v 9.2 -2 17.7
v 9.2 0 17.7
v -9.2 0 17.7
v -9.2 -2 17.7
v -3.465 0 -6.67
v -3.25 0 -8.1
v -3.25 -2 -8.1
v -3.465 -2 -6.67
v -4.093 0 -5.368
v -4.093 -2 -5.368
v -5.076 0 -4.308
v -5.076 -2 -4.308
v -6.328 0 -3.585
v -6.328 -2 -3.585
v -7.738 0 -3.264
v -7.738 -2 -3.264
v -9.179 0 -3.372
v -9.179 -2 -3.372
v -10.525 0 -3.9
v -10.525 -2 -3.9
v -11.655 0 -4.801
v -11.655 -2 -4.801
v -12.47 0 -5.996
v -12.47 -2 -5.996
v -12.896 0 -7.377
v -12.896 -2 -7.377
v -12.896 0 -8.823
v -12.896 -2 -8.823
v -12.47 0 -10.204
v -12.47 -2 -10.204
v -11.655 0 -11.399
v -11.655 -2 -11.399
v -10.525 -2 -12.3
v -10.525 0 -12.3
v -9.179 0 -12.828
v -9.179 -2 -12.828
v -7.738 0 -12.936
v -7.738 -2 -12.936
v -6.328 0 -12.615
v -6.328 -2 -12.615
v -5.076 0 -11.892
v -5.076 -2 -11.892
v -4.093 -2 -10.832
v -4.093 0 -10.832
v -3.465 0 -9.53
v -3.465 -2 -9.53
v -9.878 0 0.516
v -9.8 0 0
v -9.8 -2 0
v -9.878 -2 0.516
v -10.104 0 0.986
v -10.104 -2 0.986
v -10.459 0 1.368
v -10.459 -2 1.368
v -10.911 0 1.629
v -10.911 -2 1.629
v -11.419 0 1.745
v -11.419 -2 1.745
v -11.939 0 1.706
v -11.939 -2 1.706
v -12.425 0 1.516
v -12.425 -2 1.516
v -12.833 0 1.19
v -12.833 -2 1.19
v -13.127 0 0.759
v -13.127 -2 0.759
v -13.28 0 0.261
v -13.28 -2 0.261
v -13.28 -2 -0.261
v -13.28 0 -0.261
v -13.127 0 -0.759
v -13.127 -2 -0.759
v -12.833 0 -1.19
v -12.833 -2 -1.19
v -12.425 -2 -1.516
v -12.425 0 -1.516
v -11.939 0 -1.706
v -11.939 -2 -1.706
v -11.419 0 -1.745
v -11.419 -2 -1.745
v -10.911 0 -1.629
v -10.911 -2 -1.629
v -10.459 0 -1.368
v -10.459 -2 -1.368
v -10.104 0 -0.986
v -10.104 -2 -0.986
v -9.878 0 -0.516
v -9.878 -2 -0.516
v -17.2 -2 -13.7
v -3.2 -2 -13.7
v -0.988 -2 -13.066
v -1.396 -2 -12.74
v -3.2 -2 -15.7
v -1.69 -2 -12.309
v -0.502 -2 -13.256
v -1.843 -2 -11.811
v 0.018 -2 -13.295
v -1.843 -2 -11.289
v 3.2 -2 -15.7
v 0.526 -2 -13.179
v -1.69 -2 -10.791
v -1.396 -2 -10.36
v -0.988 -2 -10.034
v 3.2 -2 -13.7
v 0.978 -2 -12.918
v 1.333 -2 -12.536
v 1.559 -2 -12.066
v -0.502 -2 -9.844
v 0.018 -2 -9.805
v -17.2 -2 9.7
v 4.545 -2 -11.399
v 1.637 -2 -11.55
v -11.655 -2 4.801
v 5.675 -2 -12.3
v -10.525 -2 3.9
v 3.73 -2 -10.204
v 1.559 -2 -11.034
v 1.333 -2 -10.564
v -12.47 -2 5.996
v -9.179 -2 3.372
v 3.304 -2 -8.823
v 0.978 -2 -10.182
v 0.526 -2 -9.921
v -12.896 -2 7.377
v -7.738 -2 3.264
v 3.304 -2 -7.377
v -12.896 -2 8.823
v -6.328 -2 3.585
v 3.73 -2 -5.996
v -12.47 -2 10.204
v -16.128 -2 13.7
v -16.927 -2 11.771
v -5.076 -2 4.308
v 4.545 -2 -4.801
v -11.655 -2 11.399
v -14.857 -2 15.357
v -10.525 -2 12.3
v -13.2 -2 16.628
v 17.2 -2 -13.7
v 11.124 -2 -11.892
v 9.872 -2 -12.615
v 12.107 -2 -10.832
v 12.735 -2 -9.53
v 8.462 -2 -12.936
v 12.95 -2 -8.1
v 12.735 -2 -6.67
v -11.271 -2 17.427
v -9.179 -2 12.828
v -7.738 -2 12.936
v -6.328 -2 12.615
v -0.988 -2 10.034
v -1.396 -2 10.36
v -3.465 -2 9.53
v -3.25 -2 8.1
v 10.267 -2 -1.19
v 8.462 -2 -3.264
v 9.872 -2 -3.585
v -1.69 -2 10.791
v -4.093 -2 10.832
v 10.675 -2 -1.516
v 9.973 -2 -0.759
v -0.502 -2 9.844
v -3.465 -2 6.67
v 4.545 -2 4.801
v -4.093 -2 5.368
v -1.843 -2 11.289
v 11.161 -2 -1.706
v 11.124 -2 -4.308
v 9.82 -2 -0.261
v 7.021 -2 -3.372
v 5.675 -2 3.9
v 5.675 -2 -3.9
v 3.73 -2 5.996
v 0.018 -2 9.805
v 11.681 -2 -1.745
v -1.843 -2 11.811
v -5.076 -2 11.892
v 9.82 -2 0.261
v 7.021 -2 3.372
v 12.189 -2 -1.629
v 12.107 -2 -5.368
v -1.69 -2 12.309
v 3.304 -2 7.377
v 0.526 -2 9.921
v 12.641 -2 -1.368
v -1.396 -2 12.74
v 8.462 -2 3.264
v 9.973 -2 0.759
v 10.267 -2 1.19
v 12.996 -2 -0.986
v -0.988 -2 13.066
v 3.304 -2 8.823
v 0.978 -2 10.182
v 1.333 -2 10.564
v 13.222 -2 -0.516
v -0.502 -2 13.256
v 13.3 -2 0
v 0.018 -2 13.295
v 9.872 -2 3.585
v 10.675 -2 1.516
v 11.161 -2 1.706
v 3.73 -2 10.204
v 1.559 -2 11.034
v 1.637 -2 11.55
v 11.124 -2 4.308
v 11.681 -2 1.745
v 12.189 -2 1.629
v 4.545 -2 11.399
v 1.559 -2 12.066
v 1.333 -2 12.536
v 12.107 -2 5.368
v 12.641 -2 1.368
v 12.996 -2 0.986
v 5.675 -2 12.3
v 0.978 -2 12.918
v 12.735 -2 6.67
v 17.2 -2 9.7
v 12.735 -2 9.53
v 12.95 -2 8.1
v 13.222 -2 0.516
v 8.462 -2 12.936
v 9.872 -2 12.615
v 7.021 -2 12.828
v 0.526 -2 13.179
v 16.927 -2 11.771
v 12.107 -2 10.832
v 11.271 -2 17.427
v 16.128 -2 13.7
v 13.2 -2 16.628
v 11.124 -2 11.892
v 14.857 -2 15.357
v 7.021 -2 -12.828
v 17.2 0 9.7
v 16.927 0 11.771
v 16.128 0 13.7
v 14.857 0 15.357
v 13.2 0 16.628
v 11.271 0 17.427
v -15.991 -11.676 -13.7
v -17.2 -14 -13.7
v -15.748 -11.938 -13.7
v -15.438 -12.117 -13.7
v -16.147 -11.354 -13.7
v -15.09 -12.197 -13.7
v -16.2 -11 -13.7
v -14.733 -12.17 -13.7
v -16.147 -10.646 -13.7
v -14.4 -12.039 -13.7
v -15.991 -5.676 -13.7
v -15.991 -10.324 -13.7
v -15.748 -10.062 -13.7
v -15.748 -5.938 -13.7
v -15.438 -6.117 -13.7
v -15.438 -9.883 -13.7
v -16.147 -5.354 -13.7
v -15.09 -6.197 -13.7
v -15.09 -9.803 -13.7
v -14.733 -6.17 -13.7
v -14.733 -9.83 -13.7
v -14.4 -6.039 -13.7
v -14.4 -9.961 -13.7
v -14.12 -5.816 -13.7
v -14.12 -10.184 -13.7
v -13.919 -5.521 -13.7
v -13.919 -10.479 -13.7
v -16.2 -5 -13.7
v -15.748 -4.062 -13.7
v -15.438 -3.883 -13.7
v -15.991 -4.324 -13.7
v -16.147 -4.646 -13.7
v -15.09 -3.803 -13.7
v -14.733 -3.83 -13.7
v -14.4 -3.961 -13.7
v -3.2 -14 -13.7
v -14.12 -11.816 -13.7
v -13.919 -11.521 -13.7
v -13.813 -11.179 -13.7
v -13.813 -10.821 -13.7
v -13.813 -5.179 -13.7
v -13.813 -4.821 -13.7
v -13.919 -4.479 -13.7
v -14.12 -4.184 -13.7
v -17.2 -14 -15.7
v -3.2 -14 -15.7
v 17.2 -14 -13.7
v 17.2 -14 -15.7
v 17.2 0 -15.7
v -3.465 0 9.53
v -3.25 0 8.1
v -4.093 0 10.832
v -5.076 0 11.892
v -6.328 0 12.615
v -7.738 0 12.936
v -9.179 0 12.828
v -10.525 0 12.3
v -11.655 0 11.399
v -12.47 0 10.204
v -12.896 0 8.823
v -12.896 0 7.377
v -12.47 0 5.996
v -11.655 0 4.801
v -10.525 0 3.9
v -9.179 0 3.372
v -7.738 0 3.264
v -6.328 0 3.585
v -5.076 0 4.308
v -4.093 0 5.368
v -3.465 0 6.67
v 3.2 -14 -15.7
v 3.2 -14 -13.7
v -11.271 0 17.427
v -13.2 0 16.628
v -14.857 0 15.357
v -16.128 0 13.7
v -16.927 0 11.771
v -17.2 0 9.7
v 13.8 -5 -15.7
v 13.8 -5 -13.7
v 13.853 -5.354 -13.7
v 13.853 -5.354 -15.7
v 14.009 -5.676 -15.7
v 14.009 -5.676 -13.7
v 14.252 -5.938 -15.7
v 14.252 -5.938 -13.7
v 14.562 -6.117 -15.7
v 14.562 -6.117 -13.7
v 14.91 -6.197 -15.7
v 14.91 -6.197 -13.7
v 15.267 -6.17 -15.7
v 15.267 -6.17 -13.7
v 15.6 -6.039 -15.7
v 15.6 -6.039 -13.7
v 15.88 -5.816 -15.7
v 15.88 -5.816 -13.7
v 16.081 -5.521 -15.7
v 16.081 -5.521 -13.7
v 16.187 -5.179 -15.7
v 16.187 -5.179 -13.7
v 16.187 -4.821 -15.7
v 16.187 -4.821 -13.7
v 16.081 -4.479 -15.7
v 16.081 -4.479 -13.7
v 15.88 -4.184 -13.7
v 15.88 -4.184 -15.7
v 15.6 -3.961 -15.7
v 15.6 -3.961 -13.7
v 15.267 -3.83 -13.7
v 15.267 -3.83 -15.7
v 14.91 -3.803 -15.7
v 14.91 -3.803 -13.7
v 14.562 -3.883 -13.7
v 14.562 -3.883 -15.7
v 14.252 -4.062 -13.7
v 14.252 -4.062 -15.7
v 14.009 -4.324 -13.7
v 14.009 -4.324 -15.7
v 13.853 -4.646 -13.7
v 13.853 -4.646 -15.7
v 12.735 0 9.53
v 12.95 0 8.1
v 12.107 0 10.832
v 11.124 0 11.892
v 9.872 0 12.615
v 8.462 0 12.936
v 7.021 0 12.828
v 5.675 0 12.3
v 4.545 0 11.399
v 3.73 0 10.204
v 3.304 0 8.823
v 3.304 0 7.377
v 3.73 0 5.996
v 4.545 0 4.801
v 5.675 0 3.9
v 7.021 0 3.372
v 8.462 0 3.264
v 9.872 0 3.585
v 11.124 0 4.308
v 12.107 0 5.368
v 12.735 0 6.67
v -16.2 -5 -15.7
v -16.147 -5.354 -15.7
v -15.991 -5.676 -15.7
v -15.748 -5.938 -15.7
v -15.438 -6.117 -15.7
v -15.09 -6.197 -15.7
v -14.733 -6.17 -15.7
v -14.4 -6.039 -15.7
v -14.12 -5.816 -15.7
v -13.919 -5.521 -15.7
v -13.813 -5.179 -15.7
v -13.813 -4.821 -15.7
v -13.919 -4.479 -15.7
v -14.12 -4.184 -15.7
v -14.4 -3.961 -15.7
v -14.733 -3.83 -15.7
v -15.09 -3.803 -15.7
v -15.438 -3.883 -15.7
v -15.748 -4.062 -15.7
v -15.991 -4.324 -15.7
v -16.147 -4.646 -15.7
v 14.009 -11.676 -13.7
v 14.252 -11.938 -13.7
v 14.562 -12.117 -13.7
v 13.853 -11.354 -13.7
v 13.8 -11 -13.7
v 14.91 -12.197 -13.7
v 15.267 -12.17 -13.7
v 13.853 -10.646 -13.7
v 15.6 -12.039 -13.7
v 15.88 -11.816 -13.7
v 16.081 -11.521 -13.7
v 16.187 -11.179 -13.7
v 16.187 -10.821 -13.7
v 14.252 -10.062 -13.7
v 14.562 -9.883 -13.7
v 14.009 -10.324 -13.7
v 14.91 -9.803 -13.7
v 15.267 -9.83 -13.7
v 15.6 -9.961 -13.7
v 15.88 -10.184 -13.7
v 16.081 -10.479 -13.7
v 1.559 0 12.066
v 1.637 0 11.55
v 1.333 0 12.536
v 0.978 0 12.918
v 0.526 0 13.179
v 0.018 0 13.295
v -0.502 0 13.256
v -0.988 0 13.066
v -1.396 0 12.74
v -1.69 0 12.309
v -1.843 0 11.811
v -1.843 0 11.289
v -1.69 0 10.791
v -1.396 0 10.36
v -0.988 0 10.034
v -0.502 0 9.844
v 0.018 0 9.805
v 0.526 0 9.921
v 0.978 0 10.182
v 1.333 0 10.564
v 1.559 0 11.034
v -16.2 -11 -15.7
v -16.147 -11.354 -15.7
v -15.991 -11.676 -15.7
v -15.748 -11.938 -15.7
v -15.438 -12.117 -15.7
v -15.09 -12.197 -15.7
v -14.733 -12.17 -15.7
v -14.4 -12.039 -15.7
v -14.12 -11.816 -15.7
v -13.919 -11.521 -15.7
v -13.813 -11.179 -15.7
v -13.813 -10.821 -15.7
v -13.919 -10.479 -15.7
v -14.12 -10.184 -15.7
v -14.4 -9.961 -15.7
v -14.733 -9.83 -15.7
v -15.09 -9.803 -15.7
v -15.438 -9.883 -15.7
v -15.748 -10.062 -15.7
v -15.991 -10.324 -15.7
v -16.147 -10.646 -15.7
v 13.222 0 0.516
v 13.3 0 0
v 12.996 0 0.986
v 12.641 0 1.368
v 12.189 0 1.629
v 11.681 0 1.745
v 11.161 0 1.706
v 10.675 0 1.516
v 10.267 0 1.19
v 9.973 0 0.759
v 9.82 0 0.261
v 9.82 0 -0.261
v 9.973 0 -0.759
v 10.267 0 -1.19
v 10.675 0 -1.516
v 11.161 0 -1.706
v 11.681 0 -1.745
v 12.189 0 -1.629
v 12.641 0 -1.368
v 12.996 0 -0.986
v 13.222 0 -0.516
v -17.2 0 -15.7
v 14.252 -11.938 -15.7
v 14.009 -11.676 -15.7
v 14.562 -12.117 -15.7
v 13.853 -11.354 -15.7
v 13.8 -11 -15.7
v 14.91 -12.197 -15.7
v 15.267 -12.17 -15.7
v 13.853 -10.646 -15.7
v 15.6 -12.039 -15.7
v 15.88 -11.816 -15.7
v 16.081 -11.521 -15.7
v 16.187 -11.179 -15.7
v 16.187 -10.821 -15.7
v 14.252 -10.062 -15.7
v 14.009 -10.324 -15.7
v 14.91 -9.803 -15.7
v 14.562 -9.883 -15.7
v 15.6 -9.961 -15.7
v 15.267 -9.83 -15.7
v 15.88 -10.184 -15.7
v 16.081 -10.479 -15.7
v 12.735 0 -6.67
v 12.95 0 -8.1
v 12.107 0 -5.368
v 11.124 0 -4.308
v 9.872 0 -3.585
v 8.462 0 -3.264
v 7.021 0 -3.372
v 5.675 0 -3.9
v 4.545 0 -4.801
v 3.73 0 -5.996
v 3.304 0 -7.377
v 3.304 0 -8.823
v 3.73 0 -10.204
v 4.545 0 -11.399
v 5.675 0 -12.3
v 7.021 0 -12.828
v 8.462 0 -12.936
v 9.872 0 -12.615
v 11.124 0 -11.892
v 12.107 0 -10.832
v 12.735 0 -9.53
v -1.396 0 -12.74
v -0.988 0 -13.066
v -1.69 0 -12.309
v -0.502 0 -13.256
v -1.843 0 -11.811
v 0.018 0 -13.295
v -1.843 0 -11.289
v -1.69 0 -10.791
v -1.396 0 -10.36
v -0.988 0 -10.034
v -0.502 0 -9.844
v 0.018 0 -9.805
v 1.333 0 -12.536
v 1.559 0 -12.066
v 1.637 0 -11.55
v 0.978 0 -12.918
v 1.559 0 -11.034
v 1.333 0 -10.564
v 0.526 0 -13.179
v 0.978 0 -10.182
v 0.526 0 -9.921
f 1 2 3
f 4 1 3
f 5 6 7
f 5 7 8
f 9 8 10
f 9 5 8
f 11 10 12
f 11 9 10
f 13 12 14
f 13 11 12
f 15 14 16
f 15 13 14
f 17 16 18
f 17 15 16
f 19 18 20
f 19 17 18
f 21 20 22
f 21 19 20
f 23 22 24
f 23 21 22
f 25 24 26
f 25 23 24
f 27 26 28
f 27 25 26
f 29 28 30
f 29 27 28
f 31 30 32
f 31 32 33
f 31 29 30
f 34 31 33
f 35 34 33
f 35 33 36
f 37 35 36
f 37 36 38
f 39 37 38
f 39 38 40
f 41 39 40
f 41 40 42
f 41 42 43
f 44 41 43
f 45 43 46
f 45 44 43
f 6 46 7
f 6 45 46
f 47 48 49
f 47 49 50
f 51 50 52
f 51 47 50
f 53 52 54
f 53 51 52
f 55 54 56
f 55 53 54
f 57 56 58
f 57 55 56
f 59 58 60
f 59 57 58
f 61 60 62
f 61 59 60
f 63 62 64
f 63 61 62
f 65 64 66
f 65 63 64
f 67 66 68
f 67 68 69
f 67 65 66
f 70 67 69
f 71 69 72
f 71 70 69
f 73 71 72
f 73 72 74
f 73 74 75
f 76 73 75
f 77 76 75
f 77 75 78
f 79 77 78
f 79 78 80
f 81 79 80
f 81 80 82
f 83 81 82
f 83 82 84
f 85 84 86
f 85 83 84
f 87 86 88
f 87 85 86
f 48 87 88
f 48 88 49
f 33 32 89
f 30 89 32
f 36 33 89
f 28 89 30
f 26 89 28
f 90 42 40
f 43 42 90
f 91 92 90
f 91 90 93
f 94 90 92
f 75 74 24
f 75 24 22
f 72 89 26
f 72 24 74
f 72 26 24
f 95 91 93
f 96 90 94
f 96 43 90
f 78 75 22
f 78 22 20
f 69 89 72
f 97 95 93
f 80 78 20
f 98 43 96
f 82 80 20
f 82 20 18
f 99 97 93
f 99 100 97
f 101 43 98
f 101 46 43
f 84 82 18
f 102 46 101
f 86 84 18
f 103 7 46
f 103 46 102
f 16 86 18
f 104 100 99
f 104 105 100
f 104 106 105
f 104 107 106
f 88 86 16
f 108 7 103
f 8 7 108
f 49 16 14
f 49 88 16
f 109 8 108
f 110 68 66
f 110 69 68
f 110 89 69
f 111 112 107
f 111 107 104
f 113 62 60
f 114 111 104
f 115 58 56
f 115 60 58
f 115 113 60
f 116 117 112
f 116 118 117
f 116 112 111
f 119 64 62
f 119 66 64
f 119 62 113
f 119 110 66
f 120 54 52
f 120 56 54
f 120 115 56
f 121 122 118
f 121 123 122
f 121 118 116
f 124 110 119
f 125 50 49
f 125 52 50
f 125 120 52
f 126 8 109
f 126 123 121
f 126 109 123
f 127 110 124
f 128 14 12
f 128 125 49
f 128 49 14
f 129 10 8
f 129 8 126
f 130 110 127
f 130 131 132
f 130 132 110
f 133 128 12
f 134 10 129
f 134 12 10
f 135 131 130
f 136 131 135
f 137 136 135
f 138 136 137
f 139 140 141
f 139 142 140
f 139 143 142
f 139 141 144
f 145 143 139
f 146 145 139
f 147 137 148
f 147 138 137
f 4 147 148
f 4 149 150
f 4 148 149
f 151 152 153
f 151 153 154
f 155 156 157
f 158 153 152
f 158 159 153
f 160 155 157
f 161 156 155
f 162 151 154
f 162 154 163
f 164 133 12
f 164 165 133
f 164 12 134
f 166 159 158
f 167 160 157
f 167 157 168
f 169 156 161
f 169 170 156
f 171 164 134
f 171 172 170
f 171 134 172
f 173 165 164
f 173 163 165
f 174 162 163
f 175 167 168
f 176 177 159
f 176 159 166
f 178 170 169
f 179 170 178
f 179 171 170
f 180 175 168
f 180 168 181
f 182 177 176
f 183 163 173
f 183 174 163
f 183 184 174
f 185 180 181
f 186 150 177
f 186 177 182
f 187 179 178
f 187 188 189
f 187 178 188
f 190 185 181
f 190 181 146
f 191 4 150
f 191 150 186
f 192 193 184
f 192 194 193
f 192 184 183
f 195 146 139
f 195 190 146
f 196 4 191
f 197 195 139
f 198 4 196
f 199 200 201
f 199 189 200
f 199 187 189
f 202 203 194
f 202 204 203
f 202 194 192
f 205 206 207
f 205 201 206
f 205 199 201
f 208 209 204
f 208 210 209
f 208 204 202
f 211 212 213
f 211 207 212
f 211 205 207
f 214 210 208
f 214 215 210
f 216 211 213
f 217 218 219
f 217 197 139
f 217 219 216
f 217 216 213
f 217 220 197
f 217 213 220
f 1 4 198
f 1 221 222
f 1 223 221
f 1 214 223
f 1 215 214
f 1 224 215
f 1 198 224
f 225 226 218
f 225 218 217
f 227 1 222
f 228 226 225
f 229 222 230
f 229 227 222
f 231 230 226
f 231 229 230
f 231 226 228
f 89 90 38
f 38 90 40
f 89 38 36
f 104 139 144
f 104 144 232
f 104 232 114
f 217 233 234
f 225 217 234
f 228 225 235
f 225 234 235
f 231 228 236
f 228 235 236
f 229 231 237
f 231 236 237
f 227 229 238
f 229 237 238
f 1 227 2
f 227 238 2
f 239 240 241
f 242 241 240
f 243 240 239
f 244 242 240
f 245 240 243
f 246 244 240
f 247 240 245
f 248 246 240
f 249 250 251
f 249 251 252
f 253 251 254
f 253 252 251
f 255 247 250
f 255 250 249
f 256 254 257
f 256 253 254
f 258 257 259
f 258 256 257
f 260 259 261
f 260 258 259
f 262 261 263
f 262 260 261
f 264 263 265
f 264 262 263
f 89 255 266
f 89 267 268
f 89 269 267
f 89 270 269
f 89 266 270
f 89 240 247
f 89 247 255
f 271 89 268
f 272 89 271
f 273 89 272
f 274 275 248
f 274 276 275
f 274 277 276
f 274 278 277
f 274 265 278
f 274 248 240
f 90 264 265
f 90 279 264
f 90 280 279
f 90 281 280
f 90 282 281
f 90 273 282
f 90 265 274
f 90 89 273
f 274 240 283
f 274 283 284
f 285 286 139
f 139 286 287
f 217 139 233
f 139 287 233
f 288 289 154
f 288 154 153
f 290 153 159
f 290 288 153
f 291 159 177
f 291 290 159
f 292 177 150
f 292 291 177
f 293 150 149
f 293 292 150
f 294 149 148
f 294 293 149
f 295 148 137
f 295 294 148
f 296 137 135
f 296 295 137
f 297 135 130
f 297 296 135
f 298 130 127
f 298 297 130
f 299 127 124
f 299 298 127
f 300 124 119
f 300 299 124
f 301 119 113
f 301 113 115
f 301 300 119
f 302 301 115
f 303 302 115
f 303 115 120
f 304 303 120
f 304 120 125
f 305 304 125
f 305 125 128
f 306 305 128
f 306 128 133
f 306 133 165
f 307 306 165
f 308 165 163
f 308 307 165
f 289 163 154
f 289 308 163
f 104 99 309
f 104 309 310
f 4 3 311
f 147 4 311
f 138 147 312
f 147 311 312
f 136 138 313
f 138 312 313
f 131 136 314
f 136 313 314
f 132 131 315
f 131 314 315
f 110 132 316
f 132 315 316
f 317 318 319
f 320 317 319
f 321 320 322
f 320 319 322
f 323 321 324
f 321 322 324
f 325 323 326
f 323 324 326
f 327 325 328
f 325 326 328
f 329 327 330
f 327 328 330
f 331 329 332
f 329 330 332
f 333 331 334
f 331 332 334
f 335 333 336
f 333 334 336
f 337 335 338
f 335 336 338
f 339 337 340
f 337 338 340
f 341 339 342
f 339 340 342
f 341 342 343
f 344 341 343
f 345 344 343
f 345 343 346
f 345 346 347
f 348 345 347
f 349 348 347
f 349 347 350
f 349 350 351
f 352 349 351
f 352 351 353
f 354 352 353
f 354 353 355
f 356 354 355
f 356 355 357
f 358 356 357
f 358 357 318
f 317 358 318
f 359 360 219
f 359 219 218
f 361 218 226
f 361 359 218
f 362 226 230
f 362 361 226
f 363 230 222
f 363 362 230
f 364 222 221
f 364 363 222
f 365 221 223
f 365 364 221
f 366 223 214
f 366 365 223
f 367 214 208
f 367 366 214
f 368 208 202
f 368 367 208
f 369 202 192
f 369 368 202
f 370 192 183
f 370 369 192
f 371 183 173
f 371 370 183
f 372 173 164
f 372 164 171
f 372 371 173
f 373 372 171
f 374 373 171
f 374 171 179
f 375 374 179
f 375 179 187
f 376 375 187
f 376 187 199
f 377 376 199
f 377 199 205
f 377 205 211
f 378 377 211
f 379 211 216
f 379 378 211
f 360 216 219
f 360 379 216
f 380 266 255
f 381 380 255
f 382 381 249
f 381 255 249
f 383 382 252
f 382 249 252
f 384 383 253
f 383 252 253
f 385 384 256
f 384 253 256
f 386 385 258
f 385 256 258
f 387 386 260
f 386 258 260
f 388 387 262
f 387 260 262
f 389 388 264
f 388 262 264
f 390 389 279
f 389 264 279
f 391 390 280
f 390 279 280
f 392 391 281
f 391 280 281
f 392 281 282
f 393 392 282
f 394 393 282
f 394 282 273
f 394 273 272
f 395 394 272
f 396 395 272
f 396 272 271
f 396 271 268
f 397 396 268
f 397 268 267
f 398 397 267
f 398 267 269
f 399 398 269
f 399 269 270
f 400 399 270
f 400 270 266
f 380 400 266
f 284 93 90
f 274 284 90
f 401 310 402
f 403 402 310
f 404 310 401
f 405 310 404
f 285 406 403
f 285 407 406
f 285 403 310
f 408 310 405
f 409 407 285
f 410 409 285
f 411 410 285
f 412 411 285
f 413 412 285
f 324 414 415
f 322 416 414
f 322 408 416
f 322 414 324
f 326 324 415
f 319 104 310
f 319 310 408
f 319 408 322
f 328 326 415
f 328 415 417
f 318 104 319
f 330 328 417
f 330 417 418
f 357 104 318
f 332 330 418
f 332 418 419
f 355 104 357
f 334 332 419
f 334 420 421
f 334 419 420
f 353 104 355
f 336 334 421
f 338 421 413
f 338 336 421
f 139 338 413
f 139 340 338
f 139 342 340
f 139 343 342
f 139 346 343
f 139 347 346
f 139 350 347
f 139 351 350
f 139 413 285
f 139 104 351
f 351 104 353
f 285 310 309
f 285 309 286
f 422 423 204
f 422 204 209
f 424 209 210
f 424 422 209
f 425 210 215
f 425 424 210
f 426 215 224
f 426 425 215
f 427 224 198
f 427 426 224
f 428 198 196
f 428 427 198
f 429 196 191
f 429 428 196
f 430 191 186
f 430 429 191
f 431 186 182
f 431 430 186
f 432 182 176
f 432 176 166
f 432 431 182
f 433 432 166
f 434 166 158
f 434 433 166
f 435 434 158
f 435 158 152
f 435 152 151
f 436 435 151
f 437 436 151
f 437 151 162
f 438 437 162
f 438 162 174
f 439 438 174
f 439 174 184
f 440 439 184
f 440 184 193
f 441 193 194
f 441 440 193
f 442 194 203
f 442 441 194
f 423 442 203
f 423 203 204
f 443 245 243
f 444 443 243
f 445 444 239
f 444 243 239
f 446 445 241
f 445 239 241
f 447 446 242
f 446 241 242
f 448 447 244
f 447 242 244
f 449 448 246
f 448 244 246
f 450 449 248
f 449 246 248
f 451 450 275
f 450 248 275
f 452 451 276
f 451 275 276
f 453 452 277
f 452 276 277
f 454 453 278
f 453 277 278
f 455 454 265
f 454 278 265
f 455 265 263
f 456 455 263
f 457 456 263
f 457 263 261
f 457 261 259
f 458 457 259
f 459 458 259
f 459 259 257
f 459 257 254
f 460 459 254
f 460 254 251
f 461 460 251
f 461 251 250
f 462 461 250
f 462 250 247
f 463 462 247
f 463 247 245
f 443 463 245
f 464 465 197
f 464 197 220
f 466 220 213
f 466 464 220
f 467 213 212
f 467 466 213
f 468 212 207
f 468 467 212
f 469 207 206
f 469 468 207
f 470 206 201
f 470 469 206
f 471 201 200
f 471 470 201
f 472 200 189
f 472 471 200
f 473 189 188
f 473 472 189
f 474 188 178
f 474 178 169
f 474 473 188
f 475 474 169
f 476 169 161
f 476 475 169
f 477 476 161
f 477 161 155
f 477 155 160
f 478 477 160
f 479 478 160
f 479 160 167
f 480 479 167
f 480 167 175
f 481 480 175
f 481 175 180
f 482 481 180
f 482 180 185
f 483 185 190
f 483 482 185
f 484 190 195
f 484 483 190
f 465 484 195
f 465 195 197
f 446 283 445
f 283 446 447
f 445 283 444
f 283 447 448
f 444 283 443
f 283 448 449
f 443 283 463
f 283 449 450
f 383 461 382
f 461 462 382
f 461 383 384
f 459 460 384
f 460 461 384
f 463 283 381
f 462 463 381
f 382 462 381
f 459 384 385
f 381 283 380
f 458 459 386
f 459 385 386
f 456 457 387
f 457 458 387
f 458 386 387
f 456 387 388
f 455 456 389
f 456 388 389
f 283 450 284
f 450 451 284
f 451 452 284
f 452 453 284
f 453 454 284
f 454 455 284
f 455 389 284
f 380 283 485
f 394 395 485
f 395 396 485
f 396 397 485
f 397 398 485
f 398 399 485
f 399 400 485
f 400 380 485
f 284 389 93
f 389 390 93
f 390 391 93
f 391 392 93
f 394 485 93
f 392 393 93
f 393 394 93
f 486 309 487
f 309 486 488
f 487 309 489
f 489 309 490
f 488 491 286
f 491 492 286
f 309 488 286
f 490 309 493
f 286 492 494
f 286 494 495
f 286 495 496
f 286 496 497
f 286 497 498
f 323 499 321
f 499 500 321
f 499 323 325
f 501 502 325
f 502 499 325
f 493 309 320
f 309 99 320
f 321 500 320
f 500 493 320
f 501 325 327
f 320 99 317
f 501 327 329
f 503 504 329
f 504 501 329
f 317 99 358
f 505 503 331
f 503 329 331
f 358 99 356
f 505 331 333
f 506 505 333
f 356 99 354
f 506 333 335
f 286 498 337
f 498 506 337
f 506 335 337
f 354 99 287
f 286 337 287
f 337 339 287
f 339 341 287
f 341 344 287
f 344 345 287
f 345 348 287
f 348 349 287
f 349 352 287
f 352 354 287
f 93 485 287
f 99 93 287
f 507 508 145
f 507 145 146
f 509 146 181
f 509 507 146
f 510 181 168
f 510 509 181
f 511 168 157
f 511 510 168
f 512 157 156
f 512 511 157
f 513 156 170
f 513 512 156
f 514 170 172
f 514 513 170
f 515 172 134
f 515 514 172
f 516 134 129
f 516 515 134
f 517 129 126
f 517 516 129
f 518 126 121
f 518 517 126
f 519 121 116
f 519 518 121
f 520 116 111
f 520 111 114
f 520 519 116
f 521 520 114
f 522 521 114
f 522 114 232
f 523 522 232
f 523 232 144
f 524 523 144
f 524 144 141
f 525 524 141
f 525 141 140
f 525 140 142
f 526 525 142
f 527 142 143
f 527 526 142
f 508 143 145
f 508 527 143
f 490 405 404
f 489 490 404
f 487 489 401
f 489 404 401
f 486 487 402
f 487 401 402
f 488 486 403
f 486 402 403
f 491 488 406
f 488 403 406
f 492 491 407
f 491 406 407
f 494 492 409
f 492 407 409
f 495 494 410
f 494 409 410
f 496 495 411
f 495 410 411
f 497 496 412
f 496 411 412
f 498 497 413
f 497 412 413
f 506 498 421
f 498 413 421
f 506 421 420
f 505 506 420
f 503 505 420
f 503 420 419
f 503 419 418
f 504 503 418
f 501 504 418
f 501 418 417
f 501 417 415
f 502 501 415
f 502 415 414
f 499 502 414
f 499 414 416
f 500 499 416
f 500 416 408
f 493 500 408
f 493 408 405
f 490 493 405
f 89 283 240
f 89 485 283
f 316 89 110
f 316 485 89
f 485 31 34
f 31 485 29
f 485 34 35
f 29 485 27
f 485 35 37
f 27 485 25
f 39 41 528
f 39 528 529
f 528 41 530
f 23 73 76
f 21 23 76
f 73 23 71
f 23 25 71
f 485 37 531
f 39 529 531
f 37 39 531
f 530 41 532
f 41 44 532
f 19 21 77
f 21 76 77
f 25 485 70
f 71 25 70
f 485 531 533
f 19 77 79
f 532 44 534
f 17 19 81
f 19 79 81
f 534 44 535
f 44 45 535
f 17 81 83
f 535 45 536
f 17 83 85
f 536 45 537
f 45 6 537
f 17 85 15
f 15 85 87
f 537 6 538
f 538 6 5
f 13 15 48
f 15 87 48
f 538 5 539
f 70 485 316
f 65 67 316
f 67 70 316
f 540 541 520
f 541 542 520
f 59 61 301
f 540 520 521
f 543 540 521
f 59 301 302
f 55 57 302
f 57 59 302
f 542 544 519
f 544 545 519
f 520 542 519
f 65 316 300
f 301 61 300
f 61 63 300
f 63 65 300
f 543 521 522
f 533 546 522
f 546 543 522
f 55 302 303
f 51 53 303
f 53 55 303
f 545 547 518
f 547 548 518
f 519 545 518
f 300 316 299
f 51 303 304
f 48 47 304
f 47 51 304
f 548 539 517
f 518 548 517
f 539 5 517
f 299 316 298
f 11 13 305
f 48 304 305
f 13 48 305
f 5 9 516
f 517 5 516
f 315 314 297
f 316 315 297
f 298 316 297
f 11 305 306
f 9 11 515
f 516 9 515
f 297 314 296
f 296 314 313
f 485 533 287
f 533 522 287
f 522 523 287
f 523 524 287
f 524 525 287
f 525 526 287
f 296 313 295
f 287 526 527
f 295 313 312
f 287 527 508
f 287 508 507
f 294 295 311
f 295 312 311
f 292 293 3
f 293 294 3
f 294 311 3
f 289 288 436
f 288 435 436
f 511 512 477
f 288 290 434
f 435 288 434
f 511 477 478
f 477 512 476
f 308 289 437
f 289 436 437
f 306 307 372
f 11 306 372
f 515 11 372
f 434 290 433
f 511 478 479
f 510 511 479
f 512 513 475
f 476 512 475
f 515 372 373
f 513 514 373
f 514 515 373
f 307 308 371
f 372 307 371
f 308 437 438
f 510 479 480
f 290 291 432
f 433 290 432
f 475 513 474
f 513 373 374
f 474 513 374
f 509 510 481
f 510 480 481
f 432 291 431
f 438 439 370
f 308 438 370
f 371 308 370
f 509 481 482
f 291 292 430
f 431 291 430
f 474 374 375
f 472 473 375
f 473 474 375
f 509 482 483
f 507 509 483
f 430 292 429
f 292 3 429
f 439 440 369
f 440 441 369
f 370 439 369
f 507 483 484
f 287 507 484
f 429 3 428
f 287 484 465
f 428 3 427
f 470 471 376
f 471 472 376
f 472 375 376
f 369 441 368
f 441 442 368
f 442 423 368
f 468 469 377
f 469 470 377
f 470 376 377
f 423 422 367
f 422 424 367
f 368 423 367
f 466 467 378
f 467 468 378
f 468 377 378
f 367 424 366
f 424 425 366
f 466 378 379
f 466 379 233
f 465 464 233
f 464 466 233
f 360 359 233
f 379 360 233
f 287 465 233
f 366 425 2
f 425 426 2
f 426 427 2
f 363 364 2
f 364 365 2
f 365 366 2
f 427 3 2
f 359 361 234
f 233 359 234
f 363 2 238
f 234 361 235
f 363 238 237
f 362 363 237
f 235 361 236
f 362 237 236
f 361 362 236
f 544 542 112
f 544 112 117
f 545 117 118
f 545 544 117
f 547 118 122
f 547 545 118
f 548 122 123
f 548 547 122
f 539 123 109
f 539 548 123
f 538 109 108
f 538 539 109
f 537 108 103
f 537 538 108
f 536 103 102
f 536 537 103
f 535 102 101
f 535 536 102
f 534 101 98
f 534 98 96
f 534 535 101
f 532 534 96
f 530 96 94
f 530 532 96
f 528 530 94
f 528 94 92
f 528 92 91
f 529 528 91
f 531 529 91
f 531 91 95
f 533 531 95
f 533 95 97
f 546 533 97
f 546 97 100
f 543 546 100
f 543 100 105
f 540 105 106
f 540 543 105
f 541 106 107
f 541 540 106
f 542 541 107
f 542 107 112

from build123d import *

# Parameters (mm, degrees)
F0_R     = 1.75
F0_R_2   = 4.85
F1_DEPTH = 2
F2_W     = 14
F2_H     = 2
F3_DEPTH = 12
F5_D     = 2.4


# Not quite as in the source:
# - a feature names something its author has since deleted; it is built from what else it names


with BuildPart() as f1:
    # F0 (on Front) → F1 (new body)
    with BuildSketch(Plane.XZ):
        with BuildLine():
            Line((9.2, 17.7), (-9.2, 17.7))
            ThreePointArc((-9.2, 17.7), (-14.8568542495, 15.3568542495), (-17.2, 9.7))
            Line((-17.2, 9.7), (-17.2, -15.7))
            Line((-17.2, -15.7), (17.2, -15.7))
            Line((17.2, -15.7), (17.2, 9.7))
            ThreePointArc((17.2, 9.7), (14.8568542495, 15.3568542495), (9.2, 17.7))
        make_face()
        with Locations((-0.1129766364, -11.55)):
            Circle(F0_R, mode=Mode.SUBTRACT)
        with Locations((-8.1, -8.1)):
            Circle(F0_R_2, mode=Mode.SUBTRACT)
        with Locations((-11.55, 0)):
            Circle(F0_R, mode=Mode.SUBTRACT)
        with Locations((8.1, -8.1)):
            Circle(F0_R_2, mode=Mode.SUBTRACT)
        with Locations((11.55, 0)):
            Circle(F0_R, mode=Mode.SUBTRACT)
        with Locations((-8.1, 8.1)):
            Circle(F0_R_2, mode=Mode.SUBTRACT)
        with Locations((-0.1129766364, 11.55)):
            Circle(F0_R, mode=Mode.SUBTRACT)
        with Locations((8.1, 8.1)):
            Circle(F0_R_2, mode=Mode.SUBTRACT)
    extrude(amount=F1_DEPTH)

    # F2 (on face) → F3 (join)
    with BuildSketch(Plane.XZ.offset(2)):
        with Locations((-10.2, -14.7)):
            Rectangle(F2_W, F2_H)
        with Locations((10.2, -14.7)):
            Rectangle(F2_W, F2_H)
    extrude(amount=F3_DEPTH)

    # F5 (through all)
    with Locations(Plane(origin=(0, 0, -15.7), x_dir=(1, 0, 0), z_dir=(0, 0, -1))):
        with Locations((-15, 11), (-15, 5), (15, 11), (15, 5)):
            Hole(F5_D / 2)


solid = f1.part
